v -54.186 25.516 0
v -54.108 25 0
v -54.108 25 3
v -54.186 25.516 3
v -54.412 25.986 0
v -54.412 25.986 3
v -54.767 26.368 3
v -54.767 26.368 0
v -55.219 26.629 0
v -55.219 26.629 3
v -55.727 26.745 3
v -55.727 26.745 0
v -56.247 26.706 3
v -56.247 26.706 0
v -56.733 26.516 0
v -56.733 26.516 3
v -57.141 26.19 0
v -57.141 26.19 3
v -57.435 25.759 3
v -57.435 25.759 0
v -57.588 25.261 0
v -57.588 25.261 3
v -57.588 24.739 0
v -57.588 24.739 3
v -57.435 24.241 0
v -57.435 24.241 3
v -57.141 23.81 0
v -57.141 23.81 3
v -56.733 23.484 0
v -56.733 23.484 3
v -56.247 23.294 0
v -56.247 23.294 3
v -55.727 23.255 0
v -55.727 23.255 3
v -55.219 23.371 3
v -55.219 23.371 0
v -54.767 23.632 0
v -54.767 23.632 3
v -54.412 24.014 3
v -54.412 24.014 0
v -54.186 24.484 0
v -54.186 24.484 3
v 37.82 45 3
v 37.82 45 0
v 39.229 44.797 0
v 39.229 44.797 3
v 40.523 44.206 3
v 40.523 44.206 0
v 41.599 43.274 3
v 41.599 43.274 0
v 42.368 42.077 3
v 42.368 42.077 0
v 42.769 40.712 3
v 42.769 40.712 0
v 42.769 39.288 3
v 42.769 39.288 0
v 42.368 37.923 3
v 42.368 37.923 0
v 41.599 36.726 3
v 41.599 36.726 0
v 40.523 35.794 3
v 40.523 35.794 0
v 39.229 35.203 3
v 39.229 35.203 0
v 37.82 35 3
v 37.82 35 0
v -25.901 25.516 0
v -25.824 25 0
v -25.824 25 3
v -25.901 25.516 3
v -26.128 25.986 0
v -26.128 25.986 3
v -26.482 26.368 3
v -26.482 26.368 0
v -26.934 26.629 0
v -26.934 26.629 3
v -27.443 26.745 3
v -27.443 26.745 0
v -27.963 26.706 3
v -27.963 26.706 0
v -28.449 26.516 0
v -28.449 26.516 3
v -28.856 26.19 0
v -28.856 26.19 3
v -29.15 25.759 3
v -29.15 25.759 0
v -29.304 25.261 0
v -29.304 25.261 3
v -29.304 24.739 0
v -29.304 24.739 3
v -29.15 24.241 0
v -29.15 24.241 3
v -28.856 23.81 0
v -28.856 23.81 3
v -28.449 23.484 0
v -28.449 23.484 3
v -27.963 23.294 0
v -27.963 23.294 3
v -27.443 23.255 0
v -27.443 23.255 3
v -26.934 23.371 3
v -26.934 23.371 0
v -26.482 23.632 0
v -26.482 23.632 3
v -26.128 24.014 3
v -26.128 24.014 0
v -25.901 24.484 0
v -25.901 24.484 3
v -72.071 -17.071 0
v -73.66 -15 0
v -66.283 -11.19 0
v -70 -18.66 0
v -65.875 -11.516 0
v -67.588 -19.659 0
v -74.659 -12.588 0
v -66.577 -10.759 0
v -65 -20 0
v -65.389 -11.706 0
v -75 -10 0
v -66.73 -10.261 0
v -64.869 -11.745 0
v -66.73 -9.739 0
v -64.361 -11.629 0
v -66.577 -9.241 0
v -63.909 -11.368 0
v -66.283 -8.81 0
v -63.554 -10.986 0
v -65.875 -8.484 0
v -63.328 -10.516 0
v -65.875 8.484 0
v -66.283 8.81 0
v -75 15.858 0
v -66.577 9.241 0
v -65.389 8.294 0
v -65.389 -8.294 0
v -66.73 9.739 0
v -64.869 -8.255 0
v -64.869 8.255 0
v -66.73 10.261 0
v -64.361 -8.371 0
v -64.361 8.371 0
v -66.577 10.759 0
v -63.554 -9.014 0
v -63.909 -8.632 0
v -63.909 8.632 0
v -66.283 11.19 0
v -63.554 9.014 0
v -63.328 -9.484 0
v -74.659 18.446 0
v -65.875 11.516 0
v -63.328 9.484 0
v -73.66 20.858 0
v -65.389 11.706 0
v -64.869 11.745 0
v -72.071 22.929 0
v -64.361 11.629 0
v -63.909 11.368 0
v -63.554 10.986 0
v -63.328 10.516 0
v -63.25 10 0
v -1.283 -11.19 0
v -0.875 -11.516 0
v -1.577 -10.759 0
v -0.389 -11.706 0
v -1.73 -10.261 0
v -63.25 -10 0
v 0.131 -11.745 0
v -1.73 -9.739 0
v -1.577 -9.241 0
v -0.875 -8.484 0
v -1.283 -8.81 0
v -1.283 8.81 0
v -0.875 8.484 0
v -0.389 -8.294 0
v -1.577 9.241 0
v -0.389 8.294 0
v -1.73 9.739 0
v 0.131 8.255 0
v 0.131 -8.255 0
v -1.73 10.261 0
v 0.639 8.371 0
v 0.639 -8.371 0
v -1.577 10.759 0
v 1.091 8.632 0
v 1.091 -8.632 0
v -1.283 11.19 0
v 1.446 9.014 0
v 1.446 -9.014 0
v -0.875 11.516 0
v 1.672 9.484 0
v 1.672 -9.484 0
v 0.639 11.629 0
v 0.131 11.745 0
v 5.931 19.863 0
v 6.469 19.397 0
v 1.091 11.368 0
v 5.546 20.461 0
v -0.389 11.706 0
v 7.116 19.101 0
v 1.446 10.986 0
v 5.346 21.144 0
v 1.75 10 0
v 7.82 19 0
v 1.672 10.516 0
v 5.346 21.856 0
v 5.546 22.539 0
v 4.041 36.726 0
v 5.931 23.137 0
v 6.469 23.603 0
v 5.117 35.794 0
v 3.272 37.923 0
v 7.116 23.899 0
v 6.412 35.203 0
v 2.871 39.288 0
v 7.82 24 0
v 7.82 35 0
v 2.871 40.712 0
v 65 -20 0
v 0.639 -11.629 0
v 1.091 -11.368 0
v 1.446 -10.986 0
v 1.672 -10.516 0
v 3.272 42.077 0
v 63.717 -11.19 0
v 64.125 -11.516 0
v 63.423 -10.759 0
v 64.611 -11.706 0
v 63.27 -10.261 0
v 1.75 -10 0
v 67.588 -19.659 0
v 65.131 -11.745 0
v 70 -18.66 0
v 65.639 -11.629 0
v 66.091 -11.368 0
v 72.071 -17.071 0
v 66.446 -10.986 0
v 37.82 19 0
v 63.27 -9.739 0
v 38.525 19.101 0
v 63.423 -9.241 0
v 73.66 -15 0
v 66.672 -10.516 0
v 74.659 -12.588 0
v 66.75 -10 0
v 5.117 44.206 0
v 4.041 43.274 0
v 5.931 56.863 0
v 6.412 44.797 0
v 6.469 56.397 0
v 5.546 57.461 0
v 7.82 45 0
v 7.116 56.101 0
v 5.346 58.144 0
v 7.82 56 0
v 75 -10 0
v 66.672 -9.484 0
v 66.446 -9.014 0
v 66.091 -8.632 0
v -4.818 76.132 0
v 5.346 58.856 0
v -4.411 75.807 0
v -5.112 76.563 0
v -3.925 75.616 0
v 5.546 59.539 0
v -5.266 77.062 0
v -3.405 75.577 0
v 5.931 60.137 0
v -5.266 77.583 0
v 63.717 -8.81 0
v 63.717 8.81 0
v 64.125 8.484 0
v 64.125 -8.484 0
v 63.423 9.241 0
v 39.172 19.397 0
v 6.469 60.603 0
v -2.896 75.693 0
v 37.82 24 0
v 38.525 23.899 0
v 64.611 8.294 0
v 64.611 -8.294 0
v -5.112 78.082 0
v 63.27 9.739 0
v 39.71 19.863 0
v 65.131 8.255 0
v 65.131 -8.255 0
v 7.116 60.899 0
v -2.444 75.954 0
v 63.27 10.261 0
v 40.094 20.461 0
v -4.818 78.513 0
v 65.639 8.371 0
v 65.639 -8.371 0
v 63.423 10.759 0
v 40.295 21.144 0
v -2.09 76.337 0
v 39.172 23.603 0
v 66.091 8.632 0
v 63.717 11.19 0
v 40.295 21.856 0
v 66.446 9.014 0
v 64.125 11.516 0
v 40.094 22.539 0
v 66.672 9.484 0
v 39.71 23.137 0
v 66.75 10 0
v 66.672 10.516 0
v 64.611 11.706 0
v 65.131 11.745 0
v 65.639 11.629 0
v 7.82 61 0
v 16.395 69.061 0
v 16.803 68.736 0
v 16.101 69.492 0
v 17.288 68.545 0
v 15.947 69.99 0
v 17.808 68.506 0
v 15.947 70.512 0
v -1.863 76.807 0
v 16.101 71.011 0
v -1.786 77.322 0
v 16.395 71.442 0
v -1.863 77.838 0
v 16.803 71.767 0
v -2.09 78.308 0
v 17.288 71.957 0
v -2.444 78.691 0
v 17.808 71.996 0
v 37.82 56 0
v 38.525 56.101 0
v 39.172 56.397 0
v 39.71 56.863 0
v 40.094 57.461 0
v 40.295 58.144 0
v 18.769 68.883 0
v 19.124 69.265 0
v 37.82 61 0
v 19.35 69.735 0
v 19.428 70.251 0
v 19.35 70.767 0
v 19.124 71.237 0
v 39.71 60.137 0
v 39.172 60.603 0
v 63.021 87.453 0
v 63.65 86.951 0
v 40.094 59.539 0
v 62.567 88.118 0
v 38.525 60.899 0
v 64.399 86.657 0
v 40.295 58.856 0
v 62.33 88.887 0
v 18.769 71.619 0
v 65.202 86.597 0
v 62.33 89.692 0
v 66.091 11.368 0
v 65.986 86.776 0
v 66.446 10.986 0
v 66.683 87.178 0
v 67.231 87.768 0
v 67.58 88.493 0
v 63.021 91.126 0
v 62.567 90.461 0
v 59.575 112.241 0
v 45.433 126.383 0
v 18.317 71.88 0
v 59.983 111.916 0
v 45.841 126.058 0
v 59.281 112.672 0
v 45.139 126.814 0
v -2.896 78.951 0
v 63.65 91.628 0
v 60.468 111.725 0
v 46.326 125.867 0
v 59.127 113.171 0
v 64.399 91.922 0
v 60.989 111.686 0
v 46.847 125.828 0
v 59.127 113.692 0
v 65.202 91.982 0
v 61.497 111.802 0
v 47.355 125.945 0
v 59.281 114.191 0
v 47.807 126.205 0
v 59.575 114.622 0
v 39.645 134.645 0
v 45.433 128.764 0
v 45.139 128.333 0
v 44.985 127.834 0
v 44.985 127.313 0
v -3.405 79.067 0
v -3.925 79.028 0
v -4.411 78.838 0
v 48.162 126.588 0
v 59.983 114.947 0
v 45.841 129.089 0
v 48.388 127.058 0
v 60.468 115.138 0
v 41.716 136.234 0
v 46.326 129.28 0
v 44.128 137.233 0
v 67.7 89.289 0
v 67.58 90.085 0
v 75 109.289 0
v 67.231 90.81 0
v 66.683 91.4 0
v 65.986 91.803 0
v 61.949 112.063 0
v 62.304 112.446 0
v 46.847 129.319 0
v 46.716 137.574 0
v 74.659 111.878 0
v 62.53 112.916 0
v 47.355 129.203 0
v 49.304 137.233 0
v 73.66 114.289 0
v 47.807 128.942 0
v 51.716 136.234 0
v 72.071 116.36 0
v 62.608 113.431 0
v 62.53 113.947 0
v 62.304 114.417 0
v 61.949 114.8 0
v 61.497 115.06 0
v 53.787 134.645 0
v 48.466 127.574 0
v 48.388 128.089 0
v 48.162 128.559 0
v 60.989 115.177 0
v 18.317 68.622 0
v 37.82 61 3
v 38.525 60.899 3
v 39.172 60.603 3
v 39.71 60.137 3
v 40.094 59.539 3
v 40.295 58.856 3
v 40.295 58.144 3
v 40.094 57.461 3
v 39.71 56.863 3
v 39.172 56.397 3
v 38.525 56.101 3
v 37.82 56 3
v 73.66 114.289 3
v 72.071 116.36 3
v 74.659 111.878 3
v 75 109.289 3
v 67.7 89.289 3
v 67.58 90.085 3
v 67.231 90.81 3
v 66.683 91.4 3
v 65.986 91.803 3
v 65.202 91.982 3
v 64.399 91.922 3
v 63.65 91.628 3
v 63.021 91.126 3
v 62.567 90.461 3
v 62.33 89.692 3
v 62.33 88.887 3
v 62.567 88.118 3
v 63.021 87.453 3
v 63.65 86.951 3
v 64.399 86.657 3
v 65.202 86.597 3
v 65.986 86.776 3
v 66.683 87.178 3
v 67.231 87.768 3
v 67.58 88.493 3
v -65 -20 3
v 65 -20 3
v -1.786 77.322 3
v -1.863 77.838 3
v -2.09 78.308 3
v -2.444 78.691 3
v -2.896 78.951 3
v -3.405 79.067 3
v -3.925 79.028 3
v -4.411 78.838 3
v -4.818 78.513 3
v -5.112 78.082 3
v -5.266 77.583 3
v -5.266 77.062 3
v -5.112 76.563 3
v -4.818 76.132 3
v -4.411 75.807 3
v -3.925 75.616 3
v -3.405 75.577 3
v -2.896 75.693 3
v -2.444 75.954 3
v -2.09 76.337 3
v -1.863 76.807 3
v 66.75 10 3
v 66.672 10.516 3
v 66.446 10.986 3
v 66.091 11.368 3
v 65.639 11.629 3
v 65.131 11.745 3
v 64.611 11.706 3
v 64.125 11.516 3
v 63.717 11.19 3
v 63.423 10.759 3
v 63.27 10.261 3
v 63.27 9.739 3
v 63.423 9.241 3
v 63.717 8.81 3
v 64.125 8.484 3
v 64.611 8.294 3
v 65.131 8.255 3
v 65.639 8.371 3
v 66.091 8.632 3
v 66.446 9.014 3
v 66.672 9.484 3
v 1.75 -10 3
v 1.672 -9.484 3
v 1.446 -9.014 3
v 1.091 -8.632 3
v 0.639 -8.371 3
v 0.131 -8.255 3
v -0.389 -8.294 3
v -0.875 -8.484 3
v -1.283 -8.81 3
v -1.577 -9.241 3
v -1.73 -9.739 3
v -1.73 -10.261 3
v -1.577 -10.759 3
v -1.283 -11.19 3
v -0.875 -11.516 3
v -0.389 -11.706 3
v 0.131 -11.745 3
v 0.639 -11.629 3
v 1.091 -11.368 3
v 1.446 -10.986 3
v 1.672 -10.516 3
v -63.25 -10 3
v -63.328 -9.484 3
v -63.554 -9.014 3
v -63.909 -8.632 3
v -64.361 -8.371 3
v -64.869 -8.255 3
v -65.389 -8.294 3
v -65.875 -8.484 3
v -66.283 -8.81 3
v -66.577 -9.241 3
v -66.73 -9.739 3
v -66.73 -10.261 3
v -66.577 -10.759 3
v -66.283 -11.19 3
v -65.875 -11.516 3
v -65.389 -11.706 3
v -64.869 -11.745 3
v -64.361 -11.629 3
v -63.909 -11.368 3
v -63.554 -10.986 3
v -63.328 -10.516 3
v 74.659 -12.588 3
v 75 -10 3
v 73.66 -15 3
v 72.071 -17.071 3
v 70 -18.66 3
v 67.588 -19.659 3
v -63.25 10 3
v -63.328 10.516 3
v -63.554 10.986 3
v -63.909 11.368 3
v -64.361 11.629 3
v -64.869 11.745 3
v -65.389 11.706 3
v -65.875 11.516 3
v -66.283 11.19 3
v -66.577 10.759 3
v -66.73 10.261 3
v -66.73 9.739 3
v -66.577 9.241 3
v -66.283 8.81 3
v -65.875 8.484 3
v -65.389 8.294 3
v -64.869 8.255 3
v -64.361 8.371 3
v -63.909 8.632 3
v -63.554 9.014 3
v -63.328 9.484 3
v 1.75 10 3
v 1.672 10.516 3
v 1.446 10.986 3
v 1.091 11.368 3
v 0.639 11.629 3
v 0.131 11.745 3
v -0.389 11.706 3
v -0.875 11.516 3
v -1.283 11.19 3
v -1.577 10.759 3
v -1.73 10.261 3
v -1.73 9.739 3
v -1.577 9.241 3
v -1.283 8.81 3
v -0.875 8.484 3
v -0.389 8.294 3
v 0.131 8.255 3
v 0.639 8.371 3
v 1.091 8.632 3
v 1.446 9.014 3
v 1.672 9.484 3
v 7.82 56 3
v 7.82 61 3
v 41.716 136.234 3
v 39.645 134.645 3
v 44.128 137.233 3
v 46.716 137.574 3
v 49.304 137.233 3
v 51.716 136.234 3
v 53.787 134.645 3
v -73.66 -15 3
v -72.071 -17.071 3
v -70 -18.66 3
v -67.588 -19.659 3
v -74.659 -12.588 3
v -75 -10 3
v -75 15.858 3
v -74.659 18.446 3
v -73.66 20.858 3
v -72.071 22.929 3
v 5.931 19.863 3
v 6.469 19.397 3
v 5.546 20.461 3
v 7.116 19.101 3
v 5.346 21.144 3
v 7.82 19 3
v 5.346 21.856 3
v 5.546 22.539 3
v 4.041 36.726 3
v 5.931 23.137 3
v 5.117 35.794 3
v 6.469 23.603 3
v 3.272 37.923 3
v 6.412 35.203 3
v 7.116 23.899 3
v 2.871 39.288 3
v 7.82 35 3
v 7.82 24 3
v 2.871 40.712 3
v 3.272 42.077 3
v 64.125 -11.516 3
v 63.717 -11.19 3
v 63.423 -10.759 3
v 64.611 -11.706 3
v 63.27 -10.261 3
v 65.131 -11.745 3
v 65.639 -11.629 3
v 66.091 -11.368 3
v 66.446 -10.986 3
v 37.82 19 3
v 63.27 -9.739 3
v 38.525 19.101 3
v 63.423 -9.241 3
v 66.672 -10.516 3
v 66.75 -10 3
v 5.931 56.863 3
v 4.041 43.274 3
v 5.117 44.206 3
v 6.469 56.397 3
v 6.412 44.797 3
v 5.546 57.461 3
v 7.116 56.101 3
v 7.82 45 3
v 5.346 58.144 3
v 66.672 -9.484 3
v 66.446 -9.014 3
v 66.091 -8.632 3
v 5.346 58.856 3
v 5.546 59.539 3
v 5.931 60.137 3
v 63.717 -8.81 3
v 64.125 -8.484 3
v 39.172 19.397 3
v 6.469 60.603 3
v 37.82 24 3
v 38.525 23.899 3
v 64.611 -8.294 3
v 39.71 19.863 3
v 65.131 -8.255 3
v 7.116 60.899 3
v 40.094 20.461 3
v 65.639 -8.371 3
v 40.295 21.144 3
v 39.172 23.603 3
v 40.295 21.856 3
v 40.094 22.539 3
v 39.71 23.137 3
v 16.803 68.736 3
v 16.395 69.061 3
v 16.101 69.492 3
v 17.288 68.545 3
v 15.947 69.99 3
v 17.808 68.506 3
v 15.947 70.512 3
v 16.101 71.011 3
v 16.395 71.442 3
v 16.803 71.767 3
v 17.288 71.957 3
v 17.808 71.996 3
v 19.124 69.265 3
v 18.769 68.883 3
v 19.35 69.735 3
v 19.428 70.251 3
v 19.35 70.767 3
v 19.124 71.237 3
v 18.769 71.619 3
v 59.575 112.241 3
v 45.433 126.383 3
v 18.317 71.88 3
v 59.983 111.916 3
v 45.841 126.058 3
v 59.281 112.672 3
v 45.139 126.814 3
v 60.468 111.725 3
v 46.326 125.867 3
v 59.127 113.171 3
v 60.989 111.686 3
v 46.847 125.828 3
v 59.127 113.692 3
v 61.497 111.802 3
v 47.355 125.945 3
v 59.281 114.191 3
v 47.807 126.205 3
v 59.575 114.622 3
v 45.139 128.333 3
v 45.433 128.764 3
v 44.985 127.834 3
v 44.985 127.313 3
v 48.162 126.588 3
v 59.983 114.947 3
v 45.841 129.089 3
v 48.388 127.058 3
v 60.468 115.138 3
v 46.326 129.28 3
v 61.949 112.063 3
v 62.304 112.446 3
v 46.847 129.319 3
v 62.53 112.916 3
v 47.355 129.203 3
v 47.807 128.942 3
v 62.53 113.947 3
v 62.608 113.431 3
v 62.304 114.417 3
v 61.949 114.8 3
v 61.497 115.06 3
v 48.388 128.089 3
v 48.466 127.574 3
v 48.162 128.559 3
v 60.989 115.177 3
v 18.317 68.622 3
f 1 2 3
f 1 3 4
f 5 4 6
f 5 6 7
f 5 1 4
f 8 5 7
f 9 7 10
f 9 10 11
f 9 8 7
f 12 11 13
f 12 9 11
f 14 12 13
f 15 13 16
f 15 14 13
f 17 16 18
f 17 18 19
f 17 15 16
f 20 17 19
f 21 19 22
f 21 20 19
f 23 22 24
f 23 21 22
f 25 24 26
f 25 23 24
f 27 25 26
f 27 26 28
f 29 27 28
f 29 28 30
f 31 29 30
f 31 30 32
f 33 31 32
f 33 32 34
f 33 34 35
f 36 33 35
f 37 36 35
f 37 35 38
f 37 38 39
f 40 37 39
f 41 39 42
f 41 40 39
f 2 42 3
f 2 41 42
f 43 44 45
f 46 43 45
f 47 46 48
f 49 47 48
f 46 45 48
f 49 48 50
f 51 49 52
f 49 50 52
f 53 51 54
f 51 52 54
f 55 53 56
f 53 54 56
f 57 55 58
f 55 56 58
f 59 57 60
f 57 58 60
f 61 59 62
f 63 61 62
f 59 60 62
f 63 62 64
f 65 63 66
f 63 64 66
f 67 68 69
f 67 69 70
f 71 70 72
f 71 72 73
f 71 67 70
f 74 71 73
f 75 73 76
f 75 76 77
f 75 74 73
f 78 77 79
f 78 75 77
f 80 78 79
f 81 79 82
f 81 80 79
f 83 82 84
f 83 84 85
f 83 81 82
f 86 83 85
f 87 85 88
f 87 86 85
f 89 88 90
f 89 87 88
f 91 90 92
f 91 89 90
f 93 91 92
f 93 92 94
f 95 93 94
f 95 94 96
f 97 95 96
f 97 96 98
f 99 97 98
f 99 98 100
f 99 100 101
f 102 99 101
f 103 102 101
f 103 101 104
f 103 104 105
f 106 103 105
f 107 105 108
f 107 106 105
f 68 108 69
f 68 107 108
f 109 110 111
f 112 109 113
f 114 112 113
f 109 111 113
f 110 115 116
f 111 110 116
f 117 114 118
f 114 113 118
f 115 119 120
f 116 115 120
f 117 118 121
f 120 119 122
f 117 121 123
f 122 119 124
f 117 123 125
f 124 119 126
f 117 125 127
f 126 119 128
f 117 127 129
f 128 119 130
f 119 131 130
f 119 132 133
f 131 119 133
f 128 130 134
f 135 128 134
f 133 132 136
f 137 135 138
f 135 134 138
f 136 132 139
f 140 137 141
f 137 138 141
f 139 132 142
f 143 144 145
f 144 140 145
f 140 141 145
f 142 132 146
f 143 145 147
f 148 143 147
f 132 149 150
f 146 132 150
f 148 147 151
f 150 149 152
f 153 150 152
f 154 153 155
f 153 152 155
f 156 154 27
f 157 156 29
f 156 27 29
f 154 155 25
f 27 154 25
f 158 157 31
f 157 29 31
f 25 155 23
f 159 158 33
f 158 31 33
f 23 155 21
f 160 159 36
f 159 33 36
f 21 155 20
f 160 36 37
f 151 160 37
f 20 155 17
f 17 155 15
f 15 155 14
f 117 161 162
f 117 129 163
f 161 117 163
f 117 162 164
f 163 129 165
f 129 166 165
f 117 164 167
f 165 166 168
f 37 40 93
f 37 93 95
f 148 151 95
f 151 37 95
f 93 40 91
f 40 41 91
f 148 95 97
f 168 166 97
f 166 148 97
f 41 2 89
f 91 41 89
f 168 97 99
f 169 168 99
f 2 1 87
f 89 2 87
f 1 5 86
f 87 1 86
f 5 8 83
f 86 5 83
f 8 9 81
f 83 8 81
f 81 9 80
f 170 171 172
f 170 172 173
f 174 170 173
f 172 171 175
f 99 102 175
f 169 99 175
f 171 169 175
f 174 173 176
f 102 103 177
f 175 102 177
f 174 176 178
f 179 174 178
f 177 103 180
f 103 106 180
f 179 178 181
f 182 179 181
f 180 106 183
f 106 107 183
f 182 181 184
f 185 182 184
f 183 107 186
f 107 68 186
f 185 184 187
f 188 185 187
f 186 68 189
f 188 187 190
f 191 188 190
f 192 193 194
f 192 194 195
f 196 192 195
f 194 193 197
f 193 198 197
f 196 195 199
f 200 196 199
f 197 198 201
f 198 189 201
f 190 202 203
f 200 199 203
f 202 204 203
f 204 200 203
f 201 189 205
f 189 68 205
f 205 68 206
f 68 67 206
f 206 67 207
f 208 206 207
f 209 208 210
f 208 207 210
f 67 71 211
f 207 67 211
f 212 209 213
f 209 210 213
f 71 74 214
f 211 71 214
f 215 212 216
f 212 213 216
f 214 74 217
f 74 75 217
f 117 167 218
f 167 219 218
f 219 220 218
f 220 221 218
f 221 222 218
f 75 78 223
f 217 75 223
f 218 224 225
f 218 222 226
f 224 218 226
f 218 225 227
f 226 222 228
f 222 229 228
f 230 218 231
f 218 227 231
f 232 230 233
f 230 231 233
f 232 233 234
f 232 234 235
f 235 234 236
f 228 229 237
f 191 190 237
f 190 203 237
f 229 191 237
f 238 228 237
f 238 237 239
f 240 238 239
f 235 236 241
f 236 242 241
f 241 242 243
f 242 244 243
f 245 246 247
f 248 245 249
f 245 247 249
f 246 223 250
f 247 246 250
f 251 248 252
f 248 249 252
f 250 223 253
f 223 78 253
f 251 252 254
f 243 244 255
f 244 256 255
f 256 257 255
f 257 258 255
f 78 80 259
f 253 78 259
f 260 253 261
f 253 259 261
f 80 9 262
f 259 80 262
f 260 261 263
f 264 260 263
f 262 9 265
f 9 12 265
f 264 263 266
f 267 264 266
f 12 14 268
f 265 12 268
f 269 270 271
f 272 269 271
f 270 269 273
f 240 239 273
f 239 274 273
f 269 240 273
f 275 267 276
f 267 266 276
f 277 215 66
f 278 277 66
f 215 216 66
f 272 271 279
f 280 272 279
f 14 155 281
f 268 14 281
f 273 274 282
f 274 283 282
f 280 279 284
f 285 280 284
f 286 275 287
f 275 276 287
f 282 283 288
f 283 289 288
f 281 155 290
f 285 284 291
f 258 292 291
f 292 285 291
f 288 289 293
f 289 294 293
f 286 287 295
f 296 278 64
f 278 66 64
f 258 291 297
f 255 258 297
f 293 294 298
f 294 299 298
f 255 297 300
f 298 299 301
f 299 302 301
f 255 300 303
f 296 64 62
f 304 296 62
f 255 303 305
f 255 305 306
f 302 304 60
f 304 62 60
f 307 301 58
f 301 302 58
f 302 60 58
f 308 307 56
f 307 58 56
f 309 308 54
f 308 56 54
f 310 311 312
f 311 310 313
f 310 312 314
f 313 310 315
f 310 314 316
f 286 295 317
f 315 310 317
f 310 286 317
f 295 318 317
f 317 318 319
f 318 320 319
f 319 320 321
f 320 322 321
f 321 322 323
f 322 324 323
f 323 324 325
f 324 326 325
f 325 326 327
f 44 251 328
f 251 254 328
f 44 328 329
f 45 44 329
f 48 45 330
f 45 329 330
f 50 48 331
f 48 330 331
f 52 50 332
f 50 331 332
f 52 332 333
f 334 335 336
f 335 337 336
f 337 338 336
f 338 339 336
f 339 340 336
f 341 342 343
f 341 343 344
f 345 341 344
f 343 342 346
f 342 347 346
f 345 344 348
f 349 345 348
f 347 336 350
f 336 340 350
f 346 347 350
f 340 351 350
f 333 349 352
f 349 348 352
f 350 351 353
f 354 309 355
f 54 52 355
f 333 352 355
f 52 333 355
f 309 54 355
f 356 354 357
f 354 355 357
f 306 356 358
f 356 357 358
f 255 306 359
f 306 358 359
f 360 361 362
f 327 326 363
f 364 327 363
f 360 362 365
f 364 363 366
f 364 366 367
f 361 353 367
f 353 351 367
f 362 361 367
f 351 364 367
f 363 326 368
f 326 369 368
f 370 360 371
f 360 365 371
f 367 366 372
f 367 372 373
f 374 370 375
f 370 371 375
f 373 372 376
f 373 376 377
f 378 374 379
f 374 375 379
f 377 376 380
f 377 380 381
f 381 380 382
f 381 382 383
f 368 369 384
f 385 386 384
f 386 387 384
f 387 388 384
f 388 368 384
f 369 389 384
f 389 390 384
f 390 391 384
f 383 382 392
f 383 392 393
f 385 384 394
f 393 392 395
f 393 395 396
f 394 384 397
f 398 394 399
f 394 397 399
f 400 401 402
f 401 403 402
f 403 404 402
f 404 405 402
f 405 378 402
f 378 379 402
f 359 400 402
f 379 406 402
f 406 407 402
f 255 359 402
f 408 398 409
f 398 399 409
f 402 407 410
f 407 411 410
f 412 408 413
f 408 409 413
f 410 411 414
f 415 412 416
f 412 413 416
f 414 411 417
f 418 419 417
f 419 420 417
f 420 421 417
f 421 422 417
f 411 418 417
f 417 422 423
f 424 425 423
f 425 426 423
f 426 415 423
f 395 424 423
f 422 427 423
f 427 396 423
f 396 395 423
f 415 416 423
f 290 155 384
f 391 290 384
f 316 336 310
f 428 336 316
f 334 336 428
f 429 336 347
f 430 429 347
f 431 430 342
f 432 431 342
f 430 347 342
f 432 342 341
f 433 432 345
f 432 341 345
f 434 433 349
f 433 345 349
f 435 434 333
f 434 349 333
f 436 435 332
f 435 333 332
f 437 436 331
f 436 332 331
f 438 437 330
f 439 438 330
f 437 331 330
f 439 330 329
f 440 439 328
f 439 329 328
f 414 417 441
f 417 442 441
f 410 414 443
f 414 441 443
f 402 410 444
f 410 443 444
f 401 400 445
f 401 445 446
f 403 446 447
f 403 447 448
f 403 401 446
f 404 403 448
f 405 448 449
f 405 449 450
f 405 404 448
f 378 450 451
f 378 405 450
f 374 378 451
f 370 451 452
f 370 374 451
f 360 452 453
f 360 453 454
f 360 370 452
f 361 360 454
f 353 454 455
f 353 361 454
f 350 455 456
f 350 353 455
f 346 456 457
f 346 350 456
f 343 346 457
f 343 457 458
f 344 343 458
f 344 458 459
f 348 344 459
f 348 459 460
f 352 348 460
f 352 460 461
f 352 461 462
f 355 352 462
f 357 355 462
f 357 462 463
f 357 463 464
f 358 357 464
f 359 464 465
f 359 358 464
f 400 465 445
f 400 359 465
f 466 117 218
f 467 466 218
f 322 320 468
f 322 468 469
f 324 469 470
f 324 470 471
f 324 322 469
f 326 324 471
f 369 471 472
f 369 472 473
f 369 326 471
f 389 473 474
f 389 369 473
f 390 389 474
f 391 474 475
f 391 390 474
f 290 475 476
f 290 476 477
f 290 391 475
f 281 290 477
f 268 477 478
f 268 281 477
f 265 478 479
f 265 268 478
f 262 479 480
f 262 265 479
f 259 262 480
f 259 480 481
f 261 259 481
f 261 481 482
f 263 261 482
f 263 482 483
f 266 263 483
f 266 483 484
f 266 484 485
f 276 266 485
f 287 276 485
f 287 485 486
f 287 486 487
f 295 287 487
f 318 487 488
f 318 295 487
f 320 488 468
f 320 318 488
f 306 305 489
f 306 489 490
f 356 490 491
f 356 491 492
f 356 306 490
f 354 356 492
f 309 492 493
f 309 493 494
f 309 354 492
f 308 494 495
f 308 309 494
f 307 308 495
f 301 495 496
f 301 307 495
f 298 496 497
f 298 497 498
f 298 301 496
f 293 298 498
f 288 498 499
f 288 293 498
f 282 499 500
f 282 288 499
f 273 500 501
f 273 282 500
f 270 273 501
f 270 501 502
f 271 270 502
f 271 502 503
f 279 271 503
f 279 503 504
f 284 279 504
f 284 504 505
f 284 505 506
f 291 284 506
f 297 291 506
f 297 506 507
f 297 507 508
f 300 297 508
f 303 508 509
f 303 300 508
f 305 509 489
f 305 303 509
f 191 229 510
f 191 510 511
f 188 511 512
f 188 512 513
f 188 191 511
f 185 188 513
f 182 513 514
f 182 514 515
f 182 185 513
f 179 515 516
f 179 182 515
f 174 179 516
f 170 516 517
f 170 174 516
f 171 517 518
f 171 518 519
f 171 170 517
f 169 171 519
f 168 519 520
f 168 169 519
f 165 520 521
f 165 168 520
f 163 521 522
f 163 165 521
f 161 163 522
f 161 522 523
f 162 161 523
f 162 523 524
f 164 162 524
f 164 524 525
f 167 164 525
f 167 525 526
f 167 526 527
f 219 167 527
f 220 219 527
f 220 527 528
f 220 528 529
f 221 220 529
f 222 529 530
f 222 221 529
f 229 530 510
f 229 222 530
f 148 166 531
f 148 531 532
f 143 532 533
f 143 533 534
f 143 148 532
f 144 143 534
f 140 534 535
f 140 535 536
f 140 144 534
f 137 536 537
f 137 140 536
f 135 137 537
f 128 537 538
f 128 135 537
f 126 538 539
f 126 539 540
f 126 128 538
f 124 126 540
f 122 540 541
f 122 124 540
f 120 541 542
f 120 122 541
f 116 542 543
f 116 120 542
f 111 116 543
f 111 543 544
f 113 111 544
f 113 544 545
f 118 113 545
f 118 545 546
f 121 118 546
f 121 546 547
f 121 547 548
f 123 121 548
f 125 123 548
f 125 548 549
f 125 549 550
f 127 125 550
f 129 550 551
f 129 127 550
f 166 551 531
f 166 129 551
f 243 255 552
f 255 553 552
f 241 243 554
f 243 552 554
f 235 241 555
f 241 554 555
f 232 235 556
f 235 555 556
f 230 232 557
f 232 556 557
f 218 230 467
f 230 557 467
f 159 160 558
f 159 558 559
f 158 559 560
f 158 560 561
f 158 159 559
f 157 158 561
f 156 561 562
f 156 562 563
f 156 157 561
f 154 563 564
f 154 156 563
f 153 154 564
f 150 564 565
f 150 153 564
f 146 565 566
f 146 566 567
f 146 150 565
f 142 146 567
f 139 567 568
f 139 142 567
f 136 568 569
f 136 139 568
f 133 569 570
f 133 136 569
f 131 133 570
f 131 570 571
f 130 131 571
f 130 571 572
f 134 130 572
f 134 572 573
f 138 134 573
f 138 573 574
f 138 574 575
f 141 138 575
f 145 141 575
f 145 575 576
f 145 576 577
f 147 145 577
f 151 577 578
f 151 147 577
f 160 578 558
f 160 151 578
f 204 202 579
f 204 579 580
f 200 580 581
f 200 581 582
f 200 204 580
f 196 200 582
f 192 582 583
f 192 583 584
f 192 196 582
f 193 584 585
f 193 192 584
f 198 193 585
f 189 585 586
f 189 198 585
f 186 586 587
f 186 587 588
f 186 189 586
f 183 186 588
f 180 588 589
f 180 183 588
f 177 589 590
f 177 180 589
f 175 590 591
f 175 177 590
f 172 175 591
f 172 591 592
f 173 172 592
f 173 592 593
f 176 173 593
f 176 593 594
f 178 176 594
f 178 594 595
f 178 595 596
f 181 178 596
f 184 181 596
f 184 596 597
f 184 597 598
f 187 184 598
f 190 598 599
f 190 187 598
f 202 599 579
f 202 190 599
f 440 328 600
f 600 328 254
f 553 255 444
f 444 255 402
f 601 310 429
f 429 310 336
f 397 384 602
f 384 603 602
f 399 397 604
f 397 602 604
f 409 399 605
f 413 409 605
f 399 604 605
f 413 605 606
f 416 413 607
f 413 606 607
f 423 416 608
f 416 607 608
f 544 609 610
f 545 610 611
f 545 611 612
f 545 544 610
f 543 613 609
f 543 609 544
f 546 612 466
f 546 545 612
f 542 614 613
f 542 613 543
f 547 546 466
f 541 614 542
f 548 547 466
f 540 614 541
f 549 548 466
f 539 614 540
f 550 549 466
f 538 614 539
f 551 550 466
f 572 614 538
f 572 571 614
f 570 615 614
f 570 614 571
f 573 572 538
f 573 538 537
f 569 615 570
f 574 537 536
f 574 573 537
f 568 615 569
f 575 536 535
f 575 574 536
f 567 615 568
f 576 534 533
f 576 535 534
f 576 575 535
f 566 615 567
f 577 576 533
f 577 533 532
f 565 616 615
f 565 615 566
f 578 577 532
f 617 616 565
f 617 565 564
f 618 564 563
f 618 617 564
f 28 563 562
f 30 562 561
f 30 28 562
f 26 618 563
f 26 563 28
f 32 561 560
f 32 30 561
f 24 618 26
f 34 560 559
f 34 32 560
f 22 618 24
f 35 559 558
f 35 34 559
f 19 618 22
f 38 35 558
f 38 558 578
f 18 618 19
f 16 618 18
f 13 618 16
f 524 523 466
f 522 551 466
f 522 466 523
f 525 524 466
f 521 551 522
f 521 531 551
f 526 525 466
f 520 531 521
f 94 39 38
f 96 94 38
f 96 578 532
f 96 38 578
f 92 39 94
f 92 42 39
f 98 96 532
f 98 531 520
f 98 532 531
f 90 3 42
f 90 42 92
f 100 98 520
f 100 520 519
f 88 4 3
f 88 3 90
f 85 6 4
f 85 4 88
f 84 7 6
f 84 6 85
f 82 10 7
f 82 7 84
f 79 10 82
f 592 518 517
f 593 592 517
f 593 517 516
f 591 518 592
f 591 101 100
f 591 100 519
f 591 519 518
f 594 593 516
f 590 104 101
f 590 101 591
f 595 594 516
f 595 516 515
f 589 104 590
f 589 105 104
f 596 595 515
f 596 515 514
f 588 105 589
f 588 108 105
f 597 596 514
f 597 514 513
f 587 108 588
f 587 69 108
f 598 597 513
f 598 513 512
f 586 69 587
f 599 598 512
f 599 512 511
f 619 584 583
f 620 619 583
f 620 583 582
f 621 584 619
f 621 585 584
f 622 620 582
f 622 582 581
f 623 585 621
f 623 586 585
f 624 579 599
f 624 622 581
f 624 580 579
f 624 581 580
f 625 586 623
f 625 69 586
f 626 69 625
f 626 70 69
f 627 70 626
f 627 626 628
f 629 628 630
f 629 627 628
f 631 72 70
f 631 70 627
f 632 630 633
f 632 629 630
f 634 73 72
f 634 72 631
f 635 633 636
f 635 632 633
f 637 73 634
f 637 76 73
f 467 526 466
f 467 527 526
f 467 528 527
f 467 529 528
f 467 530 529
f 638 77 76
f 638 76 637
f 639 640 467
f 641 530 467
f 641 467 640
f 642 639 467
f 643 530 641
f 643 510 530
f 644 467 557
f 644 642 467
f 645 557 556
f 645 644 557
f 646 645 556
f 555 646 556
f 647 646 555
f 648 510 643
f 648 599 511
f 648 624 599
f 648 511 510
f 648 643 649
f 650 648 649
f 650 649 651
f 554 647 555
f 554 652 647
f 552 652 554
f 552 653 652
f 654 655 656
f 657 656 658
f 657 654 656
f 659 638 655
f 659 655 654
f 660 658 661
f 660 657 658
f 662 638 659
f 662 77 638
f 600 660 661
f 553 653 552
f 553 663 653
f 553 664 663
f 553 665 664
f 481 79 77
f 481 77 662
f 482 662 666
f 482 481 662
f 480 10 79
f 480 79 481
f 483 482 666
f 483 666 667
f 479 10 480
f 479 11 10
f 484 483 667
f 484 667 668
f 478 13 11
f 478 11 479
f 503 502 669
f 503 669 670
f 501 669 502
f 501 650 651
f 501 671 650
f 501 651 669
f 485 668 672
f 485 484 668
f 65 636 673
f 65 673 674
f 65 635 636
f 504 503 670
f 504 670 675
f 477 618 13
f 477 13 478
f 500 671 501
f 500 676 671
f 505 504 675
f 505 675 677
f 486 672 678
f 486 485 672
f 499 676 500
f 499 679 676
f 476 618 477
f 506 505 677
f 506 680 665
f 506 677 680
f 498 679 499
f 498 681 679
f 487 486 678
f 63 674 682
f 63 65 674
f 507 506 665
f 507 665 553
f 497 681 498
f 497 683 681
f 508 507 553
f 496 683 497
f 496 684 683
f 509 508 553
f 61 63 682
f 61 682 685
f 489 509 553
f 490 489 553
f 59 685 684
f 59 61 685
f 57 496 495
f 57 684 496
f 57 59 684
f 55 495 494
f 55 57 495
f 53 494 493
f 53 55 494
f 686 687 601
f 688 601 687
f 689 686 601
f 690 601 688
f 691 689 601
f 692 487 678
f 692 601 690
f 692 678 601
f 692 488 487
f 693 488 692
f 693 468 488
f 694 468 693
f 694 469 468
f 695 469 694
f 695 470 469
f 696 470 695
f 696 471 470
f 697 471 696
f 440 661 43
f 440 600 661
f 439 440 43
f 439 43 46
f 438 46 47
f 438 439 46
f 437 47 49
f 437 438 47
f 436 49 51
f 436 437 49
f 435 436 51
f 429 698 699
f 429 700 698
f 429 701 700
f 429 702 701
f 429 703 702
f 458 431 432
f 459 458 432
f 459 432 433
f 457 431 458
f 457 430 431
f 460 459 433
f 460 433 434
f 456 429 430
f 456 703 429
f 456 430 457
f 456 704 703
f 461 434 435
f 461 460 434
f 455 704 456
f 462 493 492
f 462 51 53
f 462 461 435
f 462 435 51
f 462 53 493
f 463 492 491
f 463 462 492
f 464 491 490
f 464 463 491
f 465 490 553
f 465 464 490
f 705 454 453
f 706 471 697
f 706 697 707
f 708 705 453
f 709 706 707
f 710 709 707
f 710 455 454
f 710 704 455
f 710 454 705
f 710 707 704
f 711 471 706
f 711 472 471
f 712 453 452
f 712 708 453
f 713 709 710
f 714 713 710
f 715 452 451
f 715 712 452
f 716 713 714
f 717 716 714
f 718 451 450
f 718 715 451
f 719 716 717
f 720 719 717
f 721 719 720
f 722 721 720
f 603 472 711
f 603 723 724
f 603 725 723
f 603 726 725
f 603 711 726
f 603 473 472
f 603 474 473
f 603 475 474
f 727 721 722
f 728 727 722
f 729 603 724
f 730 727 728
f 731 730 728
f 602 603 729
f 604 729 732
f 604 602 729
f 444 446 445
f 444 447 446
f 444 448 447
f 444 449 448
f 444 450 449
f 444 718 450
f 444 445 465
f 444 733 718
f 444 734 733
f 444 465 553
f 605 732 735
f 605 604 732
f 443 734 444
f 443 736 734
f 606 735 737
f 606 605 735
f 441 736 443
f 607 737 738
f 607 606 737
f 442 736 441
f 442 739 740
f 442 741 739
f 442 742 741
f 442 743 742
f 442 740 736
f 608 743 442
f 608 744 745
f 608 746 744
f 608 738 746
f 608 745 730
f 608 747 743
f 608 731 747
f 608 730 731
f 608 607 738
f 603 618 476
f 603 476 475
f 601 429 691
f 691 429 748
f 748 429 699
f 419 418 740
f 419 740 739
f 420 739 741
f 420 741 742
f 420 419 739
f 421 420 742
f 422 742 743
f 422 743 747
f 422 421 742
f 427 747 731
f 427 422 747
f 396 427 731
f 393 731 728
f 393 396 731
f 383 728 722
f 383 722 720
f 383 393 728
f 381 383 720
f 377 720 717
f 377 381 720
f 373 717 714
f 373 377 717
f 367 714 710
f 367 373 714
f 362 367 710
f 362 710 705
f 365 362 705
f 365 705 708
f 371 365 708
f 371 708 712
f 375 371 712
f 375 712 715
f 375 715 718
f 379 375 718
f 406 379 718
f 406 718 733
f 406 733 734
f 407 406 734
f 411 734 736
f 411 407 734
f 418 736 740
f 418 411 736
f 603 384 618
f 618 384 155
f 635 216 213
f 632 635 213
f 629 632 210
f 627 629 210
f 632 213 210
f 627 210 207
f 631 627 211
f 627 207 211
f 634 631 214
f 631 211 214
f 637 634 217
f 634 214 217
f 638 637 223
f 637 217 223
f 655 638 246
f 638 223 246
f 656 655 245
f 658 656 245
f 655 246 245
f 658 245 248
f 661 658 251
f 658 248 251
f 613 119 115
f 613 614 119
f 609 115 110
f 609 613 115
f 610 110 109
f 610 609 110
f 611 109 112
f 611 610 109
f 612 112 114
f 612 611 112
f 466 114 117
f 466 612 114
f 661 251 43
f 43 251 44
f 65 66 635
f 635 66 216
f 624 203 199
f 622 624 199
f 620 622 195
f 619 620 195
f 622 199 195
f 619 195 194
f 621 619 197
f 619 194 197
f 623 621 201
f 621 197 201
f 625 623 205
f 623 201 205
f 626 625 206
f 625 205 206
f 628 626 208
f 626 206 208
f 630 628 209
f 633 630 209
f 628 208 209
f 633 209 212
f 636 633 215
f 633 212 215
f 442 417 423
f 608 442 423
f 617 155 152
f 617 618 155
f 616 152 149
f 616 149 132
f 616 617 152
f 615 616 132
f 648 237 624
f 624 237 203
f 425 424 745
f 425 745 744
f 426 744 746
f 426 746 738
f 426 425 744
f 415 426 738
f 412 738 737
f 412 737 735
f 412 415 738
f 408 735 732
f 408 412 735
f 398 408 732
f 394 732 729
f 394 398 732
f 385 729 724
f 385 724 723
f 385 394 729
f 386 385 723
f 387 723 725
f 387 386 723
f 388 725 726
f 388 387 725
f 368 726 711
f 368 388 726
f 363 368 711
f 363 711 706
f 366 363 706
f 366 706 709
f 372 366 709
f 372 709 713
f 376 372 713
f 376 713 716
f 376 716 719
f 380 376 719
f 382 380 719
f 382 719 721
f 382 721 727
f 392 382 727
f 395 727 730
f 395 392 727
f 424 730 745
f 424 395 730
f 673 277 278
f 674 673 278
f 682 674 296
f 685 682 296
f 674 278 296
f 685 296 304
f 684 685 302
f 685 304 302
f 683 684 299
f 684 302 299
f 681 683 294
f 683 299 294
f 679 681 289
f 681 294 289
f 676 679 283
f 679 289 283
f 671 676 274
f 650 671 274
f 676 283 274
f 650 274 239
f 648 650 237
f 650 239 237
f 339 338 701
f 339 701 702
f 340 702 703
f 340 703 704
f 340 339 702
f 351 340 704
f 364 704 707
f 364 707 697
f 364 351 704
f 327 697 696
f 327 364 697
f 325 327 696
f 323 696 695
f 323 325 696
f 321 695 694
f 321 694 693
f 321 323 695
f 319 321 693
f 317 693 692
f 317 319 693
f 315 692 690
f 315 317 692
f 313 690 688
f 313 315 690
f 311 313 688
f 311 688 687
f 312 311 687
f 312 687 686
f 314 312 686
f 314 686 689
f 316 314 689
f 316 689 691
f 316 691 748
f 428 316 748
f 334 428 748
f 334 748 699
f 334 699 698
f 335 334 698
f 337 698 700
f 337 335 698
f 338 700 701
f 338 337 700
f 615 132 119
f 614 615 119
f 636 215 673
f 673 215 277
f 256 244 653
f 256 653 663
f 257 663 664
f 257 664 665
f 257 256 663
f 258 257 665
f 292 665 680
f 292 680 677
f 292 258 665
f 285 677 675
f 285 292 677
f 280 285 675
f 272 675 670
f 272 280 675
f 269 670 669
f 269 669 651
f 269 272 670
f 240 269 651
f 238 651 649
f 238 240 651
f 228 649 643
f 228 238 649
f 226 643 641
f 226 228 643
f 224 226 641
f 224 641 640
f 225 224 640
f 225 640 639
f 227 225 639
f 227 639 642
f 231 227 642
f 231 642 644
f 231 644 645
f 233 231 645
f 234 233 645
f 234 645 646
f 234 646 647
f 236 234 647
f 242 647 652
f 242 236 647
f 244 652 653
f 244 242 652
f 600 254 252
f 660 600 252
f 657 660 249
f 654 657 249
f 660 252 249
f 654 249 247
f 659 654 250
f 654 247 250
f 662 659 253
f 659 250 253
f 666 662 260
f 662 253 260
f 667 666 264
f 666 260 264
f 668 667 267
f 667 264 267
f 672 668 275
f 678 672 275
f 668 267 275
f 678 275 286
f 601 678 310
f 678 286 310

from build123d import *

# Parameters (mm, degrees)
SKETCH1_R           = 1.75
SKETCH1_R_2         = 2.7
BOSS_EXTRUDE1_DEPTH = 3
FILLET1_R           = 10


with BuildPart() as part:
    # Sketch1 → Boss-Extrude1 (new body)
    with BuildSketch(Plane.XY):
        Polygon((46.715728753, 141.715728753), (-75, 20), (-75, -20), (75, -20), (75, 20), (75, 113.431457505), align=None)
        with Locations((-65, -10)):
            Circle(SKETCH1_R, mode=Mode.SUBTRACT)
        with Locations((-65, 10)):
            Circle(SKETCH1_R, mode=Mode.SUBTRACT)
        with Locations((0, 10)):
            Circle(SKETCH1_R, mode=Mode.SUBTRACT)
        with Locations((-55.857864376, 25)):
            Circle(SKETCH1_R, mode=Mode.SUBTRACT)
        with Locations((-27.573593129, 25)):
            Circle(SKETCH1_R, mode=Mode.SUBTRACT)
        with Locations((0, -10)):
            Circle(SKETCH1_R, mode=Mode.SUBTRACT)
        with Locations((65, -10)):
            Circle(SKETCH1_R, mode=Mode.SUBTRACT)
        with Locations((65, 10)):
            Circle(SKETCH1_R, mode=Mode.SUBTRACT)
        with BuildLine():
            ThreePointArc((7.820236345, 19), (5.320236345, 21.5), (7.820236345, 24))
            Line((7.820236345, 24), (37.820236345, 24))
            ThreePointArc((37.820236345, 24), (40.320236345, 21.5), (37.820236345, 19))
            Line((37.820236345, 19), (7.820236345, 19))
        make_face(mode=Mode.SUBTRACT)
        with BuildLine():
            ThreePointArc((7.820236345, 35), (2.820236345, 40), (7.820236345, 45))
            Line((7.820236345, 45), (37.820236345, 45))
            ThreePointArc((37.820236345, 45), (42.820236345, 40), (37.820236345, 35))
            Line((37.820236345, 35), (7.820236345, 35))
        make_face(mode=Mode.SUBTRACT)
        with BuildLine():
            ThreePointArc((7.820236345, 56), (5.320236345, 58.5), (7.820236345, 61))
            Line((7.820236345, 61), (37.820236345, 61))
            ThreePointArc((37.820236345, 61), (40.320236345, 58.5), (37.820236345, 56))
            Line((37.820236345, 56), (7.820236345, 56))
        make_face(mode=Mode.SUBTRACT)
        with Locations((-3.535533906, 77.32233047)):
            Circle(SKETCH1_R, mode=Mode.SUBTRACT)
        with Locations((17.67766953, 70.251262658)):
            Circle(SKETCH1_R, mode=Mode.SUBTRACT)
        with Locations((65, 89.289321881)):
            Circle(SKETCH1_R_2, mode=Mode.SUBTRACT)
        with Locations((60.857864376, 113.431457505)):
            Circle(SKETCH1_R, mode=Mode.SUBTRACT)
        with Locations((46.715728753, 127.573593129)):
            Circle(SKETCH1_R, mode=Mode.SUBTRACT)
    extrude(amount=BOSS_EXTRUDE1_DEPTH)

    # Fillet1
    fillet1_edges = [part.edges().sort_by_distance(p)[0] for p in [
        (75, -20, 1.5),
        (-75, -20, 1.5),
        (-75, 20, 1.5),
        (46.715728753, 141.715728753, 1.5),
        (75, 113.431457505, 1.5),
    ]]
    fillet(fillet1_edges, radius=FILLET1_R)


solid = part.part
